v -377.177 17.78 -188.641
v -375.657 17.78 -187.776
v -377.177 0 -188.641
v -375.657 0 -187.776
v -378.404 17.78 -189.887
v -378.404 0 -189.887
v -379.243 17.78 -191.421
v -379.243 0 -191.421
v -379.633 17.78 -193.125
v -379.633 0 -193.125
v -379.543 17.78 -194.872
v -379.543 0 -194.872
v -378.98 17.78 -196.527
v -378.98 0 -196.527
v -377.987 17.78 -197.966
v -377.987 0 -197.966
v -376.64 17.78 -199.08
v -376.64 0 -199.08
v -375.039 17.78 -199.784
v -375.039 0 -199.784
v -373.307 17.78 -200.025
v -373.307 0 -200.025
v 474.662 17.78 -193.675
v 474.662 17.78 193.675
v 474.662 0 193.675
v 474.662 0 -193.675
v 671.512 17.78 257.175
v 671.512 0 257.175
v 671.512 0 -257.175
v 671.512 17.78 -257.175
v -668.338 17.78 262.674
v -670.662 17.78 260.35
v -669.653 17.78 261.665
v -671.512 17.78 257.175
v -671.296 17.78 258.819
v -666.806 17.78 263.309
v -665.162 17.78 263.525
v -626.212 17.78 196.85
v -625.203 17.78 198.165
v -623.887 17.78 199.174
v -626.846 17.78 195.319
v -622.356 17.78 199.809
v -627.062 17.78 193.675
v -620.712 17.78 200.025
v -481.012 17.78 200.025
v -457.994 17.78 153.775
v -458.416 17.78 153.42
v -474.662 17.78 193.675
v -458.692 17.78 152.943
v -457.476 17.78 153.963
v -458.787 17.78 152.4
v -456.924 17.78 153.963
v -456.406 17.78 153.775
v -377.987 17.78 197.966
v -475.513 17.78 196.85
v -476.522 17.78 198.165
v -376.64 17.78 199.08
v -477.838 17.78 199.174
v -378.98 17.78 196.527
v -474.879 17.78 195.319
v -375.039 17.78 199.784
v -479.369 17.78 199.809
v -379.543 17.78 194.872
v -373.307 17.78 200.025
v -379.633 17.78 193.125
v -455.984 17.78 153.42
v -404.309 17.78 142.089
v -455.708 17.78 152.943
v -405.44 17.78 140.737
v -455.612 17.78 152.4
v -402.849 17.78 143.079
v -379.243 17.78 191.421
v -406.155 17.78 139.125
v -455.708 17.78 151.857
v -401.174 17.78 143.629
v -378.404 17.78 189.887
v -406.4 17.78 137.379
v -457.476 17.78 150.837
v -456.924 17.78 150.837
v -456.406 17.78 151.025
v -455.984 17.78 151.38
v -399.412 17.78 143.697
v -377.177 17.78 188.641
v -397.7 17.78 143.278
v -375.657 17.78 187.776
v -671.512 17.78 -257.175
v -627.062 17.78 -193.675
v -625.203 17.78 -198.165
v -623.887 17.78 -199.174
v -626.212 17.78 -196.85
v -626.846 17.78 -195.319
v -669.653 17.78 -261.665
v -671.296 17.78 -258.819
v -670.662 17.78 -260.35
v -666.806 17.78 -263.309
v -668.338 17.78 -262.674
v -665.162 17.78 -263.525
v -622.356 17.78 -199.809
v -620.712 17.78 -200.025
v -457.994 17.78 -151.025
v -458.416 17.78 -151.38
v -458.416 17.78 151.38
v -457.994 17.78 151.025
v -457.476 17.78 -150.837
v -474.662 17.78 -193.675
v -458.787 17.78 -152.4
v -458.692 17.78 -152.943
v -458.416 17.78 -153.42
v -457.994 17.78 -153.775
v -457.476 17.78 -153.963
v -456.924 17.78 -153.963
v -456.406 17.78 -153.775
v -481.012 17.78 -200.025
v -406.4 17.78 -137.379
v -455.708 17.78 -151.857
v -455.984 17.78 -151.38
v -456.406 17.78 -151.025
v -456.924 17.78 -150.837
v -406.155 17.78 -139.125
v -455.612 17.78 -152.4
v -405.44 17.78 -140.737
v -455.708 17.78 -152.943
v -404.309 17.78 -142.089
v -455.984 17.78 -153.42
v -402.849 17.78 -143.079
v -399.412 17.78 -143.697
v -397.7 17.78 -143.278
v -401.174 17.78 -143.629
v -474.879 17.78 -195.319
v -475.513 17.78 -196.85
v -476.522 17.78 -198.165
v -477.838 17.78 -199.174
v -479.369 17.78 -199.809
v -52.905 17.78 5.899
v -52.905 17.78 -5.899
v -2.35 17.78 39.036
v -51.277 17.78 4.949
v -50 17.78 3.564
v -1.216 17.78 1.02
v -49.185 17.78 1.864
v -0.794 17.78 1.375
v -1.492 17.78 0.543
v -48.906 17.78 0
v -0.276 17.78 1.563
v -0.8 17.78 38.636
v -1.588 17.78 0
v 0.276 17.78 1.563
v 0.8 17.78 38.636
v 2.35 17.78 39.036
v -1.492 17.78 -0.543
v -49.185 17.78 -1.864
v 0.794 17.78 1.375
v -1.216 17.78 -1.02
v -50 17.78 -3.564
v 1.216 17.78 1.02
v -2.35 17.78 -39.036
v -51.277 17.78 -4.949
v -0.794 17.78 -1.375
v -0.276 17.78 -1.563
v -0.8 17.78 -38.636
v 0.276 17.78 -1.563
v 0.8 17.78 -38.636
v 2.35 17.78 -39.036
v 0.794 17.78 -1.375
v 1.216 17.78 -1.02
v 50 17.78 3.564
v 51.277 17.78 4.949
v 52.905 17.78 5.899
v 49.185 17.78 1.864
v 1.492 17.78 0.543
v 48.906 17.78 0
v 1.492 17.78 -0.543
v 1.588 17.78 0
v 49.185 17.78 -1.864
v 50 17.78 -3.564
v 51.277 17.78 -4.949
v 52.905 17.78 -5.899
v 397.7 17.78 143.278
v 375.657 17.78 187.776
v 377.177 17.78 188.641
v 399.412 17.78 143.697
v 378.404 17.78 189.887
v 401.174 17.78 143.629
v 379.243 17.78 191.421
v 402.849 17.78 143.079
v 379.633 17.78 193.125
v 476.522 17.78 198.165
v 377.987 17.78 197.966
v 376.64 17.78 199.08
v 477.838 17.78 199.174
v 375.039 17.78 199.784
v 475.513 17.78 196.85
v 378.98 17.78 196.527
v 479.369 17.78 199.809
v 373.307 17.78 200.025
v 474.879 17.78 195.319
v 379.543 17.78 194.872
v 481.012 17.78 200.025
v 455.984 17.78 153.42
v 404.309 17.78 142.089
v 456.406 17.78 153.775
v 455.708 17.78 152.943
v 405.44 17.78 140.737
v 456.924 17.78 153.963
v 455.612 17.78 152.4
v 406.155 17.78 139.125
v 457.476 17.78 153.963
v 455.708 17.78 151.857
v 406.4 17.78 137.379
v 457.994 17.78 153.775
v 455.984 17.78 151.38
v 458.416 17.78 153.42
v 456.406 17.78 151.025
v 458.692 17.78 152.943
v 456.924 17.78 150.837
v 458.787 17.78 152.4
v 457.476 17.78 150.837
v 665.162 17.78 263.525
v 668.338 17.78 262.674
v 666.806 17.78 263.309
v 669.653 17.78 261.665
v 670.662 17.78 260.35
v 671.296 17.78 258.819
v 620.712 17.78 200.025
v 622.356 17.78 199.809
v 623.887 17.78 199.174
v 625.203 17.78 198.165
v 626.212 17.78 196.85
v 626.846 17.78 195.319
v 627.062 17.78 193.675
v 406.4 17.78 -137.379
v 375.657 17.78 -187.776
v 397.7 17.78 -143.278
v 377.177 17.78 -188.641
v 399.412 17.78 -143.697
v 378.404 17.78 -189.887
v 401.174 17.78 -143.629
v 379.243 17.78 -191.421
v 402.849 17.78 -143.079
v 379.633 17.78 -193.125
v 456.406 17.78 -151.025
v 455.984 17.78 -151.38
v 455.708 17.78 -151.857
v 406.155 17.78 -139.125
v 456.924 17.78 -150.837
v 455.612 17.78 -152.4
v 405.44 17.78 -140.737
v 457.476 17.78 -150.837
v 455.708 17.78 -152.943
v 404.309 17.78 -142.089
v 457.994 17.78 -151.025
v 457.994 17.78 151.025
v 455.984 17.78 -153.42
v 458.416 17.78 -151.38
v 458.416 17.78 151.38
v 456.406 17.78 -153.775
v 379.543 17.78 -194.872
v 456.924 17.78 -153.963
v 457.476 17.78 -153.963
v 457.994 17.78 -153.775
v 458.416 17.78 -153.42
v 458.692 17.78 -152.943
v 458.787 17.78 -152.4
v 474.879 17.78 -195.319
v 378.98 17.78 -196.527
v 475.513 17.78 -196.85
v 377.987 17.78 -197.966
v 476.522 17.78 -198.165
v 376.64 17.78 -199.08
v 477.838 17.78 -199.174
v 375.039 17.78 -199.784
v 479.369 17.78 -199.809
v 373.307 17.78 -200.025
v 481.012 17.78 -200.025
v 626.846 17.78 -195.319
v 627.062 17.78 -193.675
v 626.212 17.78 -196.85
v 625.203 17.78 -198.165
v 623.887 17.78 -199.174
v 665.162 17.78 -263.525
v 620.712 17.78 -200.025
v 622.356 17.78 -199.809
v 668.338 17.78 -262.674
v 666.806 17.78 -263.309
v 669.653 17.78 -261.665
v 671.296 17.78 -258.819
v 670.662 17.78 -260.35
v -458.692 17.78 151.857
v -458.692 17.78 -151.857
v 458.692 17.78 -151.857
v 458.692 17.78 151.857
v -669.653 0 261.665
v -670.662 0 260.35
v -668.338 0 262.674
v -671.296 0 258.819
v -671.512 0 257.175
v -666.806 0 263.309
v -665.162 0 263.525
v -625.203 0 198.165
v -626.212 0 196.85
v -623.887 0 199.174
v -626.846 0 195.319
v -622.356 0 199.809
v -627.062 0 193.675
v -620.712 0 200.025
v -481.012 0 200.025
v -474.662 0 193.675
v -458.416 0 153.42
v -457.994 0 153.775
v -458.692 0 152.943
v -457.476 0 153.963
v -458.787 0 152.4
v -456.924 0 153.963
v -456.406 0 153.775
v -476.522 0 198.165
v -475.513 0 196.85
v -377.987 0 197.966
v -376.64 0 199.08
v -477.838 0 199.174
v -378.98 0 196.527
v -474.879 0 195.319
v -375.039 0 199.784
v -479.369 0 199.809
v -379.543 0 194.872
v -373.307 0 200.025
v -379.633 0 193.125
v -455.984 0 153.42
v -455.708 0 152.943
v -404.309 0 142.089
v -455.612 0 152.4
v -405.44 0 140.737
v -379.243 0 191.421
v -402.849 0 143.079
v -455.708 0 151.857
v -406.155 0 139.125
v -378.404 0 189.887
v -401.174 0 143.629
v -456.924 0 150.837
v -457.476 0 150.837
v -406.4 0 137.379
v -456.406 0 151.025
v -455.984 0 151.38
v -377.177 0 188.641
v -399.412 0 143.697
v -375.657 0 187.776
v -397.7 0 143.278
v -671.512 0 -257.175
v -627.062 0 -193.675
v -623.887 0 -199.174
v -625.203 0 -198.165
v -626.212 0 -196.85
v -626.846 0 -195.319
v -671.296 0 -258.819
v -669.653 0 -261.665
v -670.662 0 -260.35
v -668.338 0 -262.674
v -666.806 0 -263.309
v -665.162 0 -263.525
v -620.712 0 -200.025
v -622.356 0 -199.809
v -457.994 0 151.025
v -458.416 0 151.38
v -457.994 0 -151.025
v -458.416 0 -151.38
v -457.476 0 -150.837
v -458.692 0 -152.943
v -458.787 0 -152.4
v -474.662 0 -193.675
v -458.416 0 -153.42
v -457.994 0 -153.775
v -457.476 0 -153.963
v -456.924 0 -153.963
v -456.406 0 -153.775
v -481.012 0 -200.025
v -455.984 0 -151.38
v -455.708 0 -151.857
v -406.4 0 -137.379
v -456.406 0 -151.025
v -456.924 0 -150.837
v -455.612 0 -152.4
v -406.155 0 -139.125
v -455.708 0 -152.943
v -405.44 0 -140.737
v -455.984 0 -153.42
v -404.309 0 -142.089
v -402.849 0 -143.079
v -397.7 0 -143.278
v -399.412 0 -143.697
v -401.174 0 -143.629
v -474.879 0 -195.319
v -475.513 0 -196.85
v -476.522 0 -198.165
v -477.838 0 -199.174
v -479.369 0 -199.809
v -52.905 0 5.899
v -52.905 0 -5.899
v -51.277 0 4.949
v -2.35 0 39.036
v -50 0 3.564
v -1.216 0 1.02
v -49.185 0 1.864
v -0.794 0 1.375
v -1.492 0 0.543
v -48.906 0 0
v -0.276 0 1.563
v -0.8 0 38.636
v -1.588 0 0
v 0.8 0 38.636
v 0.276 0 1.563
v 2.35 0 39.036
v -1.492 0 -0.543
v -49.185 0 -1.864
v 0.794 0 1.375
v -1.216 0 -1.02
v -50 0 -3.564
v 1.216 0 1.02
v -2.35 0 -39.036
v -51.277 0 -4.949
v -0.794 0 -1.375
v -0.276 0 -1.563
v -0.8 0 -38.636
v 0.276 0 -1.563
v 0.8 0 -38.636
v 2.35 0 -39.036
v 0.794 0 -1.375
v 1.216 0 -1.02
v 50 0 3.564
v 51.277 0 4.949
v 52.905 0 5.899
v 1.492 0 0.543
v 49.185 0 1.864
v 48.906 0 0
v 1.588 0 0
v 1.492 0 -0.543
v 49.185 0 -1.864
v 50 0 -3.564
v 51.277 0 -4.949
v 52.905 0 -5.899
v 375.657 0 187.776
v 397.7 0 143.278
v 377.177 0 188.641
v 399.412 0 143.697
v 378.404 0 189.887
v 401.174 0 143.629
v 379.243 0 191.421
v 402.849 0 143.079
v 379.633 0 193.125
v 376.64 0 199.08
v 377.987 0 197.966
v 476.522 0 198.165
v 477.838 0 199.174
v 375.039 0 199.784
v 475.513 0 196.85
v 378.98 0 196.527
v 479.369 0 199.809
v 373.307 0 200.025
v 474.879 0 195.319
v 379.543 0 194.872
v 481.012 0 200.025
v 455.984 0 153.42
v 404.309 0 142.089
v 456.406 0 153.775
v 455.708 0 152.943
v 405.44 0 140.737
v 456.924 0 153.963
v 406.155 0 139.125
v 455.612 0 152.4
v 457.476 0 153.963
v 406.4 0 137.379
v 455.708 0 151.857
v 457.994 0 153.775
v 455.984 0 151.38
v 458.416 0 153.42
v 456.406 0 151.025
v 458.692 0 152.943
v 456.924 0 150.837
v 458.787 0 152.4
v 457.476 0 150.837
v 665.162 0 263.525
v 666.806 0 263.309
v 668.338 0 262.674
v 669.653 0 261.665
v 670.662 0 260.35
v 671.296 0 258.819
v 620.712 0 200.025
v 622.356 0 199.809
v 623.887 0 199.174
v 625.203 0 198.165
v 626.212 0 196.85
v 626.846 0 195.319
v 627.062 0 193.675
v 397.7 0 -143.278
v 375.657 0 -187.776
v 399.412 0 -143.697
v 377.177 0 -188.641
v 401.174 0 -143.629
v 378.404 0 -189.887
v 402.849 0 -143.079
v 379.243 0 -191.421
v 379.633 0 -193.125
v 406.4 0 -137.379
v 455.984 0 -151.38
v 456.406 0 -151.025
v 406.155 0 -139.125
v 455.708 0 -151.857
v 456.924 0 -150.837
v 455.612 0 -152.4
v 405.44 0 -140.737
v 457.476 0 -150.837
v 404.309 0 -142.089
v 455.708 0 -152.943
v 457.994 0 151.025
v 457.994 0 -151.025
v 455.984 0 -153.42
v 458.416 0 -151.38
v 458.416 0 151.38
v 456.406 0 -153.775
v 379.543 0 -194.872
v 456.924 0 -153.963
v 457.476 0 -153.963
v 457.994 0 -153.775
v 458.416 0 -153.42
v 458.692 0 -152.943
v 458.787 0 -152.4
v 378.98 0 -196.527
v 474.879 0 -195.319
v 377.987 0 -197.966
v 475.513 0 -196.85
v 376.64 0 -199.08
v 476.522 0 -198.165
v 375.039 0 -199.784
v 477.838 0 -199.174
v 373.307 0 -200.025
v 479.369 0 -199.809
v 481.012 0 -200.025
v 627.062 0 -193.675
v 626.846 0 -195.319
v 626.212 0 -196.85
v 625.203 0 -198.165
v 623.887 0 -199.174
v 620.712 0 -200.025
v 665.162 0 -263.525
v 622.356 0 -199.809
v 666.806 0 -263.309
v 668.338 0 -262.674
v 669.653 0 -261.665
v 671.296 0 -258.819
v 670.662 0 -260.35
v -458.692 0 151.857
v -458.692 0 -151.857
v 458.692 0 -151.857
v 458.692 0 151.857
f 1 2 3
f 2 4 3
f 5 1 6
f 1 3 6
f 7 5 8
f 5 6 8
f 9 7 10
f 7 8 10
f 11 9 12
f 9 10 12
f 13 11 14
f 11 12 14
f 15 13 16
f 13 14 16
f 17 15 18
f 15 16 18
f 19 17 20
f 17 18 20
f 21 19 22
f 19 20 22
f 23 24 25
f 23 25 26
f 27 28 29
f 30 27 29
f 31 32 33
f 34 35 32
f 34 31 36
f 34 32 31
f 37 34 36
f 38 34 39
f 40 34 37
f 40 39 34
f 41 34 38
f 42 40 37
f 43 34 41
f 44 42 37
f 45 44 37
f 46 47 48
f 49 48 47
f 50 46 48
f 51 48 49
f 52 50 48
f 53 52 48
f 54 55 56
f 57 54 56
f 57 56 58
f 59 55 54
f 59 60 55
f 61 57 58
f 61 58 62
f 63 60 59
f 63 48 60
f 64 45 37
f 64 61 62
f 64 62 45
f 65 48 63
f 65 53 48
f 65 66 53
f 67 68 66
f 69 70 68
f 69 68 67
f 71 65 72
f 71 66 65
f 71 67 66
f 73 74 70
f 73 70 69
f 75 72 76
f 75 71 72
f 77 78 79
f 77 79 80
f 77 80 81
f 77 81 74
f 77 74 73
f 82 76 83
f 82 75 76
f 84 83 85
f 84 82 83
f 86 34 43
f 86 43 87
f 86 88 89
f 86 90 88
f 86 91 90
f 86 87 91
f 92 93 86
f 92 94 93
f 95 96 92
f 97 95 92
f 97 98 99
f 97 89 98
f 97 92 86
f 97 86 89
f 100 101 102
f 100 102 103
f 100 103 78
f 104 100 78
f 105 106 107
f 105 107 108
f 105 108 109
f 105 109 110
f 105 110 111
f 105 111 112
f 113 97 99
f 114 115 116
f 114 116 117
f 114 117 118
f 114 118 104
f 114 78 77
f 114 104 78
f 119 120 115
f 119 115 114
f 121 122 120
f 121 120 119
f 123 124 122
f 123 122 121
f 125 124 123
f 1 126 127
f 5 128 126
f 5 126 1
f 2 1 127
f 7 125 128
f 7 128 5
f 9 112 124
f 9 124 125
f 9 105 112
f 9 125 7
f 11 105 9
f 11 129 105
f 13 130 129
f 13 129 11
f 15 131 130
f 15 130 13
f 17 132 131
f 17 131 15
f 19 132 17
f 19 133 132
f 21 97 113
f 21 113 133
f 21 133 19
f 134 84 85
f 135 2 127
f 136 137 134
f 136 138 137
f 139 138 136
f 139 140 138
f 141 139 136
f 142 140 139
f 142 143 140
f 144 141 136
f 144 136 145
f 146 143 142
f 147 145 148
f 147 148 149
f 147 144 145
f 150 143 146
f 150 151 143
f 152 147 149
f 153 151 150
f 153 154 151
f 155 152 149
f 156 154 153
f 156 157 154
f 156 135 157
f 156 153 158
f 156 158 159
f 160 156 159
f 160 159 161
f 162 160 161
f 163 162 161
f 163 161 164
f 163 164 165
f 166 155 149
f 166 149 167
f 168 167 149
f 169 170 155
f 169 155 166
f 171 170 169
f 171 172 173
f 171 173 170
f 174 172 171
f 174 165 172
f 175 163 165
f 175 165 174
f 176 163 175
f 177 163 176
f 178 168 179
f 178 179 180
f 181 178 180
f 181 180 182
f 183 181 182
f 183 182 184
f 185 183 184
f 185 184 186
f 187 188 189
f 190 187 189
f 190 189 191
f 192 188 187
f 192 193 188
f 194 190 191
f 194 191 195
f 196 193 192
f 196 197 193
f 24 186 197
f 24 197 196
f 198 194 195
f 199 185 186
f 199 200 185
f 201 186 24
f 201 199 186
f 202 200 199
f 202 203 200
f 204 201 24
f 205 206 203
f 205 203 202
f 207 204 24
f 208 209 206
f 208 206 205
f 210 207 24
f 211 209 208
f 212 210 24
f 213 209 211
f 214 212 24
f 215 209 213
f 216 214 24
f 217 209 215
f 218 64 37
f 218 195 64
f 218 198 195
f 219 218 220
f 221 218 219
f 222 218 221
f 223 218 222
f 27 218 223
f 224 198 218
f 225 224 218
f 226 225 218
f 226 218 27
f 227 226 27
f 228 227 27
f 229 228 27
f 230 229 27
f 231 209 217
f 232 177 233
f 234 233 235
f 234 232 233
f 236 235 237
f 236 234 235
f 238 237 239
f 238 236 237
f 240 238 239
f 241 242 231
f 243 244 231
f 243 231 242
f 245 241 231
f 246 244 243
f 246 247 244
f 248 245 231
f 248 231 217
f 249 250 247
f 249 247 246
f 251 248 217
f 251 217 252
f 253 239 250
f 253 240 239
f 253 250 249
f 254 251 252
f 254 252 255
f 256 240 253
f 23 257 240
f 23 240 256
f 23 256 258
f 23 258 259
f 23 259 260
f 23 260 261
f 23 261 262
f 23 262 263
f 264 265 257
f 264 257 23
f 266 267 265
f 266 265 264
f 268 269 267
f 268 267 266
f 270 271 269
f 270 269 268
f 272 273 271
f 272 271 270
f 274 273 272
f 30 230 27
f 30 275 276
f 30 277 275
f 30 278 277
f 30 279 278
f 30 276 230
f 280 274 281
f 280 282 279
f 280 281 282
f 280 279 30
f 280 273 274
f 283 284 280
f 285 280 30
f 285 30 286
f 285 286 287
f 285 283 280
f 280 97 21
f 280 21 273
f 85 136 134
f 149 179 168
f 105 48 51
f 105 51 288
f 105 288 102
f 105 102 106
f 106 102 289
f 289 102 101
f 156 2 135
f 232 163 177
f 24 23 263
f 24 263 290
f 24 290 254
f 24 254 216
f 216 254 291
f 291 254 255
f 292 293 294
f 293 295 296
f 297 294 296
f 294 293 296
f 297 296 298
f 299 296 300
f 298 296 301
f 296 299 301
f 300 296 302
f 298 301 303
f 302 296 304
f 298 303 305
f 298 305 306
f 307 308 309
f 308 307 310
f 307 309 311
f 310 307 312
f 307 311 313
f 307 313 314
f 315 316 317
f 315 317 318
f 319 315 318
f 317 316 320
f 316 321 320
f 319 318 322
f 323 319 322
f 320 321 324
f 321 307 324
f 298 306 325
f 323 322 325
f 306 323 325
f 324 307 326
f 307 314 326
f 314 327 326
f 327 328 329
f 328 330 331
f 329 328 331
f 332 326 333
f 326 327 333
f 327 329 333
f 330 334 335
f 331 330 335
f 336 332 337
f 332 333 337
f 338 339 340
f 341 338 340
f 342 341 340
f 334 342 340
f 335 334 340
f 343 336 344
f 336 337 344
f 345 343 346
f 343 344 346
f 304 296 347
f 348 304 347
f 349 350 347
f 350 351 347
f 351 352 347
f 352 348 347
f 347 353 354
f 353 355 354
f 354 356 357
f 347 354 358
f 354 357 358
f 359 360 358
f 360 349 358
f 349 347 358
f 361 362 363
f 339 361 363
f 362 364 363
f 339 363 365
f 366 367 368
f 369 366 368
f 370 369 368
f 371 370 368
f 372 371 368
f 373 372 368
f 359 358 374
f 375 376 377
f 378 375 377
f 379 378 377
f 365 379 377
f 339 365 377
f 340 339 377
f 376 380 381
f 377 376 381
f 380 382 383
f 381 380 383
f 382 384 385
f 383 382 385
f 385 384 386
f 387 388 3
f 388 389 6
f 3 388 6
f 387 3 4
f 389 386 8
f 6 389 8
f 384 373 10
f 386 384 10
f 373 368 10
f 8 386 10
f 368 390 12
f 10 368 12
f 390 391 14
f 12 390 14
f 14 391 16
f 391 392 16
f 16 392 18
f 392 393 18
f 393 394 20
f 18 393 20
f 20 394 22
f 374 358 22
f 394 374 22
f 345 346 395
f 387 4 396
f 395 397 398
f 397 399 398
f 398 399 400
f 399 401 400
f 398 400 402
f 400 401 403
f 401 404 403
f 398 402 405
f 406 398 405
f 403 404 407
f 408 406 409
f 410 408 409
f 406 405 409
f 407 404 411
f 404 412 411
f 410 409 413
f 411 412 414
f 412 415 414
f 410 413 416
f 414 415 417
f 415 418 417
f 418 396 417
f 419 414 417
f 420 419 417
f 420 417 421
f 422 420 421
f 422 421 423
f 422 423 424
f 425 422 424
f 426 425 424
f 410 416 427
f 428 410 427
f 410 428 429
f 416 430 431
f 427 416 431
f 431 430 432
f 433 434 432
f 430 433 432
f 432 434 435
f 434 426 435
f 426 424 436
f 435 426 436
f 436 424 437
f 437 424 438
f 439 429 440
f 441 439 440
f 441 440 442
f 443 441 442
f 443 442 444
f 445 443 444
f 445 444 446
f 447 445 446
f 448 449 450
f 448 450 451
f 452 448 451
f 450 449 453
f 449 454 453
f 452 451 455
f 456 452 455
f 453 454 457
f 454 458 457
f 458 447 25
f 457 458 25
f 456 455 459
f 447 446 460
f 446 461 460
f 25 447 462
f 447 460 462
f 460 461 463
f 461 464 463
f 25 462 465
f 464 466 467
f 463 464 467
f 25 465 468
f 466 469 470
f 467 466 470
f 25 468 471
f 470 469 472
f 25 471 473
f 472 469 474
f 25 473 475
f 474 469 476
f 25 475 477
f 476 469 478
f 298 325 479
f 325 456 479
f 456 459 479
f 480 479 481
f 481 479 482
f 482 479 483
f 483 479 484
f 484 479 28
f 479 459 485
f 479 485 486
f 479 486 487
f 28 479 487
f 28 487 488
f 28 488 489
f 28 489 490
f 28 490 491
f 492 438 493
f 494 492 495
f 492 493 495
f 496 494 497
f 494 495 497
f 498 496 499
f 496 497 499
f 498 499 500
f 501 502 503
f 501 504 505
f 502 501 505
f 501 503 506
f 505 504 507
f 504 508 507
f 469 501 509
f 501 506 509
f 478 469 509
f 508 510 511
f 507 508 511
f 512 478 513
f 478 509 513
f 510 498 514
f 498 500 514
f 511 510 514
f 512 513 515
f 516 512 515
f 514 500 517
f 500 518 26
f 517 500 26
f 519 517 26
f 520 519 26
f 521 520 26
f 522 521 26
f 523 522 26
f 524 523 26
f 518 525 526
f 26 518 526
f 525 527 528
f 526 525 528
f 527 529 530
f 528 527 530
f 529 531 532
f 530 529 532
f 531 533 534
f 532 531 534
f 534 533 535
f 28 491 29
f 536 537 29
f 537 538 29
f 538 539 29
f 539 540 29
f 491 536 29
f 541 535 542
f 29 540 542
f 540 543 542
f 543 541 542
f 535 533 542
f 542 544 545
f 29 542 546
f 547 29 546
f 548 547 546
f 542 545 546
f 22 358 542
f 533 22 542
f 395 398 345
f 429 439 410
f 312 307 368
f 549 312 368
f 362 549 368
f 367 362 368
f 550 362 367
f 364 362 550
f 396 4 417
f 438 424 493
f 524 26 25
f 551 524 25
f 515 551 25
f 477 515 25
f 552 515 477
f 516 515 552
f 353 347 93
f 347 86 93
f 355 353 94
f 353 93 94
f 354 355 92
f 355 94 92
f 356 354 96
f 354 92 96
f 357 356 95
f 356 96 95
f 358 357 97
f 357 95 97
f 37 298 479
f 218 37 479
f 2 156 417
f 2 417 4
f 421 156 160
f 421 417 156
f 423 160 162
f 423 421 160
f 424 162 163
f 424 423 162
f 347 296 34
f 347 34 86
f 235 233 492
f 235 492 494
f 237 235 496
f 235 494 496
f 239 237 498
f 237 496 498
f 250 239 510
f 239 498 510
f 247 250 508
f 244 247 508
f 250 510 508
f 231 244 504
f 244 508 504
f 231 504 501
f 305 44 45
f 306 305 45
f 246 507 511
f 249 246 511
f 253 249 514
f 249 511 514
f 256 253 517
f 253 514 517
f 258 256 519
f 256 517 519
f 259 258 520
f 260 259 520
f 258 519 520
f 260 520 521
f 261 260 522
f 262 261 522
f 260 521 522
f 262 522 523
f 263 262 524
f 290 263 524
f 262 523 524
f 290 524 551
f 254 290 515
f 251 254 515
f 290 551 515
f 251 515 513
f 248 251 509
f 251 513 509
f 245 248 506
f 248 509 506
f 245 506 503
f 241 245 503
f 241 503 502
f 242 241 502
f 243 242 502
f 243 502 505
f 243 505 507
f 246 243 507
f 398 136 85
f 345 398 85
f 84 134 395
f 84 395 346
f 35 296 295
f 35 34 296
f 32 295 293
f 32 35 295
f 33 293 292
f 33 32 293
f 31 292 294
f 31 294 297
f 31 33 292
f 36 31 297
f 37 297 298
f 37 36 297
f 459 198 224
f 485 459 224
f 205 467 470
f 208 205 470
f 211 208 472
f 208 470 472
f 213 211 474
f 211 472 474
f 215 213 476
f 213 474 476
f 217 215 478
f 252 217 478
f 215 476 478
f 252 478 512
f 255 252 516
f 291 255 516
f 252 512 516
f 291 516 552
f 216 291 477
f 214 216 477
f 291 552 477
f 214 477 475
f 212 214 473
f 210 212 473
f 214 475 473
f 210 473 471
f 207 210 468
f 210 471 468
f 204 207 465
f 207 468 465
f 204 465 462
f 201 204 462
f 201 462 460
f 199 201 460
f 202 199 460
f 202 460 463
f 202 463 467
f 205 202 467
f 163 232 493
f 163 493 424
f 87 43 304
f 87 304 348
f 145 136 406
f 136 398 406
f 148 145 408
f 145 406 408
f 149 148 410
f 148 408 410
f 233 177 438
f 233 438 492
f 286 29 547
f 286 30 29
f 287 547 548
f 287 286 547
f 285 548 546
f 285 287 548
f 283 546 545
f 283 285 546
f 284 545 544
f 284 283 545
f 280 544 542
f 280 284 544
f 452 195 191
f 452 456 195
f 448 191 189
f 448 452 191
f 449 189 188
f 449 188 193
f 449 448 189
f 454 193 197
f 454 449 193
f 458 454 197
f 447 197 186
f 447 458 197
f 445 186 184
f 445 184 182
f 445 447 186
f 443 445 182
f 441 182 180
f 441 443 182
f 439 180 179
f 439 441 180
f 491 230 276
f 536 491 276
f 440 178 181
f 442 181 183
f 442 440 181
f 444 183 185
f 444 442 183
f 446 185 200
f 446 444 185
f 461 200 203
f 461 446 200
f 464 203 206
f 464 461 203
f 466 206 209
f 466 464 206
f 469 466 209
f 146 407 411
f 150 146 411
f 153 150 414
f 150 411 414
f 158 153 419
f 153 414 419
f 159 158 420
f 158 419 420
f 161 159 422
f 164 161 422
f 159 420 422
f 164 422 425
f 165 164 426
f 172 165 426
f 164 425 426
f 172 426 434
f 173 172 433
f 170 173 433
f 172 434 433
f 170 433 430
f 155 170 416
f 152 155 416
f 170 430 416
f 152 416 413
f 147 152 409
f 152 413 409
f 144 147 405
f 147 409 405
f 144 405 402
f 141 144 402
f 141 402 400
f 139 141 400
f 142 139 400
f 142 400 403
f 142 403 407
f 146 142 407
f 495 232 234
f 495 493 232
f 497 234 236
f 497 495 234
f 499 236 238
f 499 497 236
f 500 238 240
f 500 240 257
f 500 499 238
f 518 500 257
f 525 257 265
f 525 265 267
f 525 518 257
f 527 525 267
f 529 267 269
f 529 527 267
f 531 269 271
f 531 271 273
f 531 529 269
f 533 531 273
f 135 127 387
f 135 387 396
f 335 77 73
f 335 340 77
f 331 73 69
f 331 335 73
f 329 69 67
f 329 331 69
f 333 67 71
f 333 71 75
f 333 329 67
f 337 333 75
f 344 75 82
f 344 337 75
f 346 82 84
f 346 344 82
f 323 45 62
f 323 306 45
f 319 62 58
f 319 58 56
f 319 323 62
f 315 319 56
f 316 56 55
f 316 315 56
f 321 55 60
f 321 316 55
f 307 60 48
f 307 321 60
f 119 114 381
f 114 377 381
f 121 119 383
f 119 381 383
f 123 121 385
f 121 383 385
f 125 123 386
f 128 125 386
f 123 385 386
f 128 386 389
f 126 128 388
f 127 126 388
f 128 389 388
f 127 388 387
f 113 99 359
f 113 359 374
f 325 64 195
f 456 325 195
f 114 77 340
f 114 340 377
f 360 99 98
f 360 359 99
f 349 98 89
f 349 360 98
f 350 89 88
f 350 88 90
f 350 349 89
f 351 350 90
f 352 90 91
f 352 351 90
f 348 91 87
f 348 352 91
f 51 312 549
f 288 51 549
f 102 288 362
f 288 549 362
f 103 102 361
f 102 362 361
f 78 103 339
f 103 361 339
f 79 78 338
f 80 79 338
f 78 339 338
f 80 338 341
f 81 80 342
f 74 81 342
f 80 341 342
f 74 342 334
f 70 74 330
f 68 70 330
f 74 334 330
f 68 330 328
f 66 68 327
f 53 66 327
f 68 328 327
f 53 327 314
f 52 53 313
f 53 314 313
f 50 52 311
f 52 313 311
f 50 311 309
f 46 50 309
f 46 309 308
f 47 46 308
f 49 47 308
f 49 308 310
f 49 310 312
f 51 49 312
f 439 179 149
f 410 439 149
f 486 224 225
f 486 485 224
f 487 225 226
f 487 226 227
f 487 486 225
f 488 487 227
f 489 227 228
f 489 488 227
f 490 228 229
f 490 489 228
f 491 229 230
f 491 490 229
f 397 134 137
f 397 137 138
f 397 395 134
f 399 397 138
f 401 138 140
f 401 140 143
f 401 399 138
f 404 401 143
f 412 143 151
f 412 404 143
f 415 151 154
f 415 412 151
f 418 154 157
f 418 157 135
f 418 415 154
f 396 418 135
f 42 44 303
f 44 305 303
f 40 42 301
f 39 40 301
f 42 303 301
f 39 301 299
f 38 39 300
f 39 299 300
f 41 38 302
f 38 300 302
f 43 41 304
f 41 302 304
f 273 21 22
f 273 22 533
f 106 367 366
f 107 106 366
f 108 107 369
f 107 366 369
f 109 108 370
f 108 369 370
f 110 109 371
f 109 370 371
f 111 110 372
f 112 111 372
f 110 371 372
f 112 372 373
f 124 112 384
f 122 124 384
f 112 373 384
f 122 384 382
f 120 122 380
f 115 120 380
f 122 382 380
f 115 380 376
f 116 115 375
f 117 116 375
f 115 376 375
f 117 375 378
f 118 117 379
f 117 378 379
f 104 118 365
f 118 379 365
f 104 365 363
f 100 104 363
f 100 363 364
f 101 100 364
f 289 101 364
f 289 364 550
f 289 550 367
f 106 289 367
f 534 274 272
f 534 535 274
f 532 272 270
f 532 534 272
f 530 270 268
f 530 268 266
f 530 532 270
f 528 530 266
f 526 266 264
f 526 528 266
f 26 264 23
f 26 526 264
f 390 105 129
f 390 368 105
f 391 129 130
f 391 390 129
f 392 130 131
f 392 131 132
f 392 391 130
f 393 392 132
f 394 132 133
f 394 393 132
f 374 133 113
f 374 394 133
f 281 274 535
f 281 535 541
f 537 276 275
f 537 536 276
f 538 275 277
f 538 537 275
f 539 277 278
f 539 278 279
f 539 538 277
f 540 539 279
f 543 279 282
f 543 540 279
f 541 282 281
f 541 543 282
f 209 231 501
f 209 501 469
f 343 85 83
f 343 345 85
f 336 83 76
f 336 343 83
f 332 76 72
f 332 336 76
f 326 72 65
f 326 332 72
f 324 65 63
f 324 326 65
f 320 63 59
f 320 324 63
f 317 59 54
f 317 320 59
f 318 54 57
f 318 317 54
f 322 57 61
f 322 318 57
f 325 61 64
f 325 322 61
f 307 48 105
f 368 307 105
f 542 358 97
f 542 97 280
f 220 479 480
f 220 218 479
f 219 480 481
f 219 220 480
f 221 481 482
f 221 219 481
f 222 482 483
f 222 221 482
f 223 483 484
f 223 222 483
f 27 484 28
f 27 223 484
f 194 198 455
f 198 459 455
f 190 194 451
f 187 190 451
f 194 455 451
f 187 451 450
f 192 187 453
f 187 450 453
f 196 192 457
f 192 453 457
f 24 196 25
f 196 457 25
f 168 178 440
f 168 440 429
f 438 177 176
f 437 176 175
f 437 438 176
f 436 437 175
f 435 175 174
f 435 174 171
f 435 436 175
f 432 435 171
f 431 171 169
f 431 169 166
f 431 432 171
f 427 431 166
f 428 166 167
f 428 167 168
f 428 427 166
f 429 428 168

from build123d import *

# Parameters (mm, degrees)
SKETCH1_W                    = 1343.025
SKETCH1_H                    = 527.05
BOSS_EXTRUDE1_DEPTH          = 17.78
FILLET1_R                    = 6.35
F_1_8_0_125_DIAMETER_HOLE1_D = 3.175
SKETCH5_W                    = 152.4
SKETCH5_H                    = 400.05
CUT_EXTRUDE1_DEPTH           = 18.78
FILLET2_R                    = 6.35


with BuildPart() as part:
    # Sketch1 → Boss-Extrude1 (new body)
    with BuildSketch(Plane(origin=(0, 0, 0), x_dir=(1, 0, 0), z_dir=(0, 1, 0))):
        Rectangle(SKETCH1_W, SKETCH1_H)
    extrude(amount=BOSS_EXTRUDE1_DEPTH)

    # Fillet1
    fillet1_edges = [part.edges().sort_by_distance(p)[0] for p in [
        (671.5125, 8.89, 263.525),
        (-671.5125, 8.89, 263.525),
        (-671.5125, 8.89, -263.525),
        (671.5125, 8.89, -263.525),
    ]]
    fillet(fillet1_edges, radius=FILLET1_R)

    # 1/8 (0.125) Diameter Hole1 (through all)
    with Locations(Plane(origin=(0, 17.78, 0), x_dir=(1, 0, 0), z_dir=(0, 1, 0))):
        with Locations((0, 0), (457.2, 152.4), (-457.2, -152.4), (-457.2, 152.4), (457.2, -152.4)):
            Hole(F_1_8_0_125_DIAMETER_HOLE1_D / 2)

    # Sketch5 → Cut-Extrude1 (cut, through all)
    with BuildSketch(Plane(origin=(0, 17.78, 0), x_dir=(1, 0, 0), z_dir=(0, 1, 0))):
        Polygon((-406.4, 200.025), (406.4, 200.025), (0, 38.1), align=None)
        Polygon((0, -38.1), (-406.4, -200.025), (406.4, -200.025), align=None)
        Polygon((406.4, 146.74453125), (406.4, -146.74453125), (38.1, 0), align=None)
        Polygon((-406.4, 146.74453125), (-38.1, 0), (-406.4, -146.74453125), align=None)
        with Locations((550.8625, 0)):
            Rectangle(SKETCH5_W, SKETCH5_H)
        with Locations((-550.8625, 0)):
            Rectangle(SKETCH5_W, SKETCH5_H)
    extrude(amount=-CUT_EXTRUDE1_DEPTH, mode=Mode.SUBTRACT)

    # Fillet2
    fillet2_edges = [part.edges().sort_by_distance(p)[0] for p in [
        (-474.6625, 8.89, -200.025),
        (-474.6625, 8.89, 200.025),
        (-627.0625, 8.89, 200.025),
        (-627.0625, 8.89, -200.025),
        (-406.4, 8.89, 146.74453125),
        (-406.4, 8.89, -146.74453125),
        (-38.1, 8.89, 0),
        (627.0625, 8.89, -200.025),
        (627.0625, 8.89, 200.025),
        (474.6625, 8.89, 200.025),
        (474.6625, 8.89, -200.025),
        (0, 8.89, 38.1),
        (406.4, 8.89, 200.025),
        (-406.4, 8.89, 200.025),
        (38.1, 8.89, 0),
        (406.4, 8.89, -146.74453125),
        (406.4, 8.89, 146.74453125),
        (406.4, 8.89, -200.025),
        (0, 8.89, -38.1),
        (-406.4, 8.89, -200.025),
    ]]
    fillet(fillet2_edges, radius=FILLET2_R)


solid = part.part
